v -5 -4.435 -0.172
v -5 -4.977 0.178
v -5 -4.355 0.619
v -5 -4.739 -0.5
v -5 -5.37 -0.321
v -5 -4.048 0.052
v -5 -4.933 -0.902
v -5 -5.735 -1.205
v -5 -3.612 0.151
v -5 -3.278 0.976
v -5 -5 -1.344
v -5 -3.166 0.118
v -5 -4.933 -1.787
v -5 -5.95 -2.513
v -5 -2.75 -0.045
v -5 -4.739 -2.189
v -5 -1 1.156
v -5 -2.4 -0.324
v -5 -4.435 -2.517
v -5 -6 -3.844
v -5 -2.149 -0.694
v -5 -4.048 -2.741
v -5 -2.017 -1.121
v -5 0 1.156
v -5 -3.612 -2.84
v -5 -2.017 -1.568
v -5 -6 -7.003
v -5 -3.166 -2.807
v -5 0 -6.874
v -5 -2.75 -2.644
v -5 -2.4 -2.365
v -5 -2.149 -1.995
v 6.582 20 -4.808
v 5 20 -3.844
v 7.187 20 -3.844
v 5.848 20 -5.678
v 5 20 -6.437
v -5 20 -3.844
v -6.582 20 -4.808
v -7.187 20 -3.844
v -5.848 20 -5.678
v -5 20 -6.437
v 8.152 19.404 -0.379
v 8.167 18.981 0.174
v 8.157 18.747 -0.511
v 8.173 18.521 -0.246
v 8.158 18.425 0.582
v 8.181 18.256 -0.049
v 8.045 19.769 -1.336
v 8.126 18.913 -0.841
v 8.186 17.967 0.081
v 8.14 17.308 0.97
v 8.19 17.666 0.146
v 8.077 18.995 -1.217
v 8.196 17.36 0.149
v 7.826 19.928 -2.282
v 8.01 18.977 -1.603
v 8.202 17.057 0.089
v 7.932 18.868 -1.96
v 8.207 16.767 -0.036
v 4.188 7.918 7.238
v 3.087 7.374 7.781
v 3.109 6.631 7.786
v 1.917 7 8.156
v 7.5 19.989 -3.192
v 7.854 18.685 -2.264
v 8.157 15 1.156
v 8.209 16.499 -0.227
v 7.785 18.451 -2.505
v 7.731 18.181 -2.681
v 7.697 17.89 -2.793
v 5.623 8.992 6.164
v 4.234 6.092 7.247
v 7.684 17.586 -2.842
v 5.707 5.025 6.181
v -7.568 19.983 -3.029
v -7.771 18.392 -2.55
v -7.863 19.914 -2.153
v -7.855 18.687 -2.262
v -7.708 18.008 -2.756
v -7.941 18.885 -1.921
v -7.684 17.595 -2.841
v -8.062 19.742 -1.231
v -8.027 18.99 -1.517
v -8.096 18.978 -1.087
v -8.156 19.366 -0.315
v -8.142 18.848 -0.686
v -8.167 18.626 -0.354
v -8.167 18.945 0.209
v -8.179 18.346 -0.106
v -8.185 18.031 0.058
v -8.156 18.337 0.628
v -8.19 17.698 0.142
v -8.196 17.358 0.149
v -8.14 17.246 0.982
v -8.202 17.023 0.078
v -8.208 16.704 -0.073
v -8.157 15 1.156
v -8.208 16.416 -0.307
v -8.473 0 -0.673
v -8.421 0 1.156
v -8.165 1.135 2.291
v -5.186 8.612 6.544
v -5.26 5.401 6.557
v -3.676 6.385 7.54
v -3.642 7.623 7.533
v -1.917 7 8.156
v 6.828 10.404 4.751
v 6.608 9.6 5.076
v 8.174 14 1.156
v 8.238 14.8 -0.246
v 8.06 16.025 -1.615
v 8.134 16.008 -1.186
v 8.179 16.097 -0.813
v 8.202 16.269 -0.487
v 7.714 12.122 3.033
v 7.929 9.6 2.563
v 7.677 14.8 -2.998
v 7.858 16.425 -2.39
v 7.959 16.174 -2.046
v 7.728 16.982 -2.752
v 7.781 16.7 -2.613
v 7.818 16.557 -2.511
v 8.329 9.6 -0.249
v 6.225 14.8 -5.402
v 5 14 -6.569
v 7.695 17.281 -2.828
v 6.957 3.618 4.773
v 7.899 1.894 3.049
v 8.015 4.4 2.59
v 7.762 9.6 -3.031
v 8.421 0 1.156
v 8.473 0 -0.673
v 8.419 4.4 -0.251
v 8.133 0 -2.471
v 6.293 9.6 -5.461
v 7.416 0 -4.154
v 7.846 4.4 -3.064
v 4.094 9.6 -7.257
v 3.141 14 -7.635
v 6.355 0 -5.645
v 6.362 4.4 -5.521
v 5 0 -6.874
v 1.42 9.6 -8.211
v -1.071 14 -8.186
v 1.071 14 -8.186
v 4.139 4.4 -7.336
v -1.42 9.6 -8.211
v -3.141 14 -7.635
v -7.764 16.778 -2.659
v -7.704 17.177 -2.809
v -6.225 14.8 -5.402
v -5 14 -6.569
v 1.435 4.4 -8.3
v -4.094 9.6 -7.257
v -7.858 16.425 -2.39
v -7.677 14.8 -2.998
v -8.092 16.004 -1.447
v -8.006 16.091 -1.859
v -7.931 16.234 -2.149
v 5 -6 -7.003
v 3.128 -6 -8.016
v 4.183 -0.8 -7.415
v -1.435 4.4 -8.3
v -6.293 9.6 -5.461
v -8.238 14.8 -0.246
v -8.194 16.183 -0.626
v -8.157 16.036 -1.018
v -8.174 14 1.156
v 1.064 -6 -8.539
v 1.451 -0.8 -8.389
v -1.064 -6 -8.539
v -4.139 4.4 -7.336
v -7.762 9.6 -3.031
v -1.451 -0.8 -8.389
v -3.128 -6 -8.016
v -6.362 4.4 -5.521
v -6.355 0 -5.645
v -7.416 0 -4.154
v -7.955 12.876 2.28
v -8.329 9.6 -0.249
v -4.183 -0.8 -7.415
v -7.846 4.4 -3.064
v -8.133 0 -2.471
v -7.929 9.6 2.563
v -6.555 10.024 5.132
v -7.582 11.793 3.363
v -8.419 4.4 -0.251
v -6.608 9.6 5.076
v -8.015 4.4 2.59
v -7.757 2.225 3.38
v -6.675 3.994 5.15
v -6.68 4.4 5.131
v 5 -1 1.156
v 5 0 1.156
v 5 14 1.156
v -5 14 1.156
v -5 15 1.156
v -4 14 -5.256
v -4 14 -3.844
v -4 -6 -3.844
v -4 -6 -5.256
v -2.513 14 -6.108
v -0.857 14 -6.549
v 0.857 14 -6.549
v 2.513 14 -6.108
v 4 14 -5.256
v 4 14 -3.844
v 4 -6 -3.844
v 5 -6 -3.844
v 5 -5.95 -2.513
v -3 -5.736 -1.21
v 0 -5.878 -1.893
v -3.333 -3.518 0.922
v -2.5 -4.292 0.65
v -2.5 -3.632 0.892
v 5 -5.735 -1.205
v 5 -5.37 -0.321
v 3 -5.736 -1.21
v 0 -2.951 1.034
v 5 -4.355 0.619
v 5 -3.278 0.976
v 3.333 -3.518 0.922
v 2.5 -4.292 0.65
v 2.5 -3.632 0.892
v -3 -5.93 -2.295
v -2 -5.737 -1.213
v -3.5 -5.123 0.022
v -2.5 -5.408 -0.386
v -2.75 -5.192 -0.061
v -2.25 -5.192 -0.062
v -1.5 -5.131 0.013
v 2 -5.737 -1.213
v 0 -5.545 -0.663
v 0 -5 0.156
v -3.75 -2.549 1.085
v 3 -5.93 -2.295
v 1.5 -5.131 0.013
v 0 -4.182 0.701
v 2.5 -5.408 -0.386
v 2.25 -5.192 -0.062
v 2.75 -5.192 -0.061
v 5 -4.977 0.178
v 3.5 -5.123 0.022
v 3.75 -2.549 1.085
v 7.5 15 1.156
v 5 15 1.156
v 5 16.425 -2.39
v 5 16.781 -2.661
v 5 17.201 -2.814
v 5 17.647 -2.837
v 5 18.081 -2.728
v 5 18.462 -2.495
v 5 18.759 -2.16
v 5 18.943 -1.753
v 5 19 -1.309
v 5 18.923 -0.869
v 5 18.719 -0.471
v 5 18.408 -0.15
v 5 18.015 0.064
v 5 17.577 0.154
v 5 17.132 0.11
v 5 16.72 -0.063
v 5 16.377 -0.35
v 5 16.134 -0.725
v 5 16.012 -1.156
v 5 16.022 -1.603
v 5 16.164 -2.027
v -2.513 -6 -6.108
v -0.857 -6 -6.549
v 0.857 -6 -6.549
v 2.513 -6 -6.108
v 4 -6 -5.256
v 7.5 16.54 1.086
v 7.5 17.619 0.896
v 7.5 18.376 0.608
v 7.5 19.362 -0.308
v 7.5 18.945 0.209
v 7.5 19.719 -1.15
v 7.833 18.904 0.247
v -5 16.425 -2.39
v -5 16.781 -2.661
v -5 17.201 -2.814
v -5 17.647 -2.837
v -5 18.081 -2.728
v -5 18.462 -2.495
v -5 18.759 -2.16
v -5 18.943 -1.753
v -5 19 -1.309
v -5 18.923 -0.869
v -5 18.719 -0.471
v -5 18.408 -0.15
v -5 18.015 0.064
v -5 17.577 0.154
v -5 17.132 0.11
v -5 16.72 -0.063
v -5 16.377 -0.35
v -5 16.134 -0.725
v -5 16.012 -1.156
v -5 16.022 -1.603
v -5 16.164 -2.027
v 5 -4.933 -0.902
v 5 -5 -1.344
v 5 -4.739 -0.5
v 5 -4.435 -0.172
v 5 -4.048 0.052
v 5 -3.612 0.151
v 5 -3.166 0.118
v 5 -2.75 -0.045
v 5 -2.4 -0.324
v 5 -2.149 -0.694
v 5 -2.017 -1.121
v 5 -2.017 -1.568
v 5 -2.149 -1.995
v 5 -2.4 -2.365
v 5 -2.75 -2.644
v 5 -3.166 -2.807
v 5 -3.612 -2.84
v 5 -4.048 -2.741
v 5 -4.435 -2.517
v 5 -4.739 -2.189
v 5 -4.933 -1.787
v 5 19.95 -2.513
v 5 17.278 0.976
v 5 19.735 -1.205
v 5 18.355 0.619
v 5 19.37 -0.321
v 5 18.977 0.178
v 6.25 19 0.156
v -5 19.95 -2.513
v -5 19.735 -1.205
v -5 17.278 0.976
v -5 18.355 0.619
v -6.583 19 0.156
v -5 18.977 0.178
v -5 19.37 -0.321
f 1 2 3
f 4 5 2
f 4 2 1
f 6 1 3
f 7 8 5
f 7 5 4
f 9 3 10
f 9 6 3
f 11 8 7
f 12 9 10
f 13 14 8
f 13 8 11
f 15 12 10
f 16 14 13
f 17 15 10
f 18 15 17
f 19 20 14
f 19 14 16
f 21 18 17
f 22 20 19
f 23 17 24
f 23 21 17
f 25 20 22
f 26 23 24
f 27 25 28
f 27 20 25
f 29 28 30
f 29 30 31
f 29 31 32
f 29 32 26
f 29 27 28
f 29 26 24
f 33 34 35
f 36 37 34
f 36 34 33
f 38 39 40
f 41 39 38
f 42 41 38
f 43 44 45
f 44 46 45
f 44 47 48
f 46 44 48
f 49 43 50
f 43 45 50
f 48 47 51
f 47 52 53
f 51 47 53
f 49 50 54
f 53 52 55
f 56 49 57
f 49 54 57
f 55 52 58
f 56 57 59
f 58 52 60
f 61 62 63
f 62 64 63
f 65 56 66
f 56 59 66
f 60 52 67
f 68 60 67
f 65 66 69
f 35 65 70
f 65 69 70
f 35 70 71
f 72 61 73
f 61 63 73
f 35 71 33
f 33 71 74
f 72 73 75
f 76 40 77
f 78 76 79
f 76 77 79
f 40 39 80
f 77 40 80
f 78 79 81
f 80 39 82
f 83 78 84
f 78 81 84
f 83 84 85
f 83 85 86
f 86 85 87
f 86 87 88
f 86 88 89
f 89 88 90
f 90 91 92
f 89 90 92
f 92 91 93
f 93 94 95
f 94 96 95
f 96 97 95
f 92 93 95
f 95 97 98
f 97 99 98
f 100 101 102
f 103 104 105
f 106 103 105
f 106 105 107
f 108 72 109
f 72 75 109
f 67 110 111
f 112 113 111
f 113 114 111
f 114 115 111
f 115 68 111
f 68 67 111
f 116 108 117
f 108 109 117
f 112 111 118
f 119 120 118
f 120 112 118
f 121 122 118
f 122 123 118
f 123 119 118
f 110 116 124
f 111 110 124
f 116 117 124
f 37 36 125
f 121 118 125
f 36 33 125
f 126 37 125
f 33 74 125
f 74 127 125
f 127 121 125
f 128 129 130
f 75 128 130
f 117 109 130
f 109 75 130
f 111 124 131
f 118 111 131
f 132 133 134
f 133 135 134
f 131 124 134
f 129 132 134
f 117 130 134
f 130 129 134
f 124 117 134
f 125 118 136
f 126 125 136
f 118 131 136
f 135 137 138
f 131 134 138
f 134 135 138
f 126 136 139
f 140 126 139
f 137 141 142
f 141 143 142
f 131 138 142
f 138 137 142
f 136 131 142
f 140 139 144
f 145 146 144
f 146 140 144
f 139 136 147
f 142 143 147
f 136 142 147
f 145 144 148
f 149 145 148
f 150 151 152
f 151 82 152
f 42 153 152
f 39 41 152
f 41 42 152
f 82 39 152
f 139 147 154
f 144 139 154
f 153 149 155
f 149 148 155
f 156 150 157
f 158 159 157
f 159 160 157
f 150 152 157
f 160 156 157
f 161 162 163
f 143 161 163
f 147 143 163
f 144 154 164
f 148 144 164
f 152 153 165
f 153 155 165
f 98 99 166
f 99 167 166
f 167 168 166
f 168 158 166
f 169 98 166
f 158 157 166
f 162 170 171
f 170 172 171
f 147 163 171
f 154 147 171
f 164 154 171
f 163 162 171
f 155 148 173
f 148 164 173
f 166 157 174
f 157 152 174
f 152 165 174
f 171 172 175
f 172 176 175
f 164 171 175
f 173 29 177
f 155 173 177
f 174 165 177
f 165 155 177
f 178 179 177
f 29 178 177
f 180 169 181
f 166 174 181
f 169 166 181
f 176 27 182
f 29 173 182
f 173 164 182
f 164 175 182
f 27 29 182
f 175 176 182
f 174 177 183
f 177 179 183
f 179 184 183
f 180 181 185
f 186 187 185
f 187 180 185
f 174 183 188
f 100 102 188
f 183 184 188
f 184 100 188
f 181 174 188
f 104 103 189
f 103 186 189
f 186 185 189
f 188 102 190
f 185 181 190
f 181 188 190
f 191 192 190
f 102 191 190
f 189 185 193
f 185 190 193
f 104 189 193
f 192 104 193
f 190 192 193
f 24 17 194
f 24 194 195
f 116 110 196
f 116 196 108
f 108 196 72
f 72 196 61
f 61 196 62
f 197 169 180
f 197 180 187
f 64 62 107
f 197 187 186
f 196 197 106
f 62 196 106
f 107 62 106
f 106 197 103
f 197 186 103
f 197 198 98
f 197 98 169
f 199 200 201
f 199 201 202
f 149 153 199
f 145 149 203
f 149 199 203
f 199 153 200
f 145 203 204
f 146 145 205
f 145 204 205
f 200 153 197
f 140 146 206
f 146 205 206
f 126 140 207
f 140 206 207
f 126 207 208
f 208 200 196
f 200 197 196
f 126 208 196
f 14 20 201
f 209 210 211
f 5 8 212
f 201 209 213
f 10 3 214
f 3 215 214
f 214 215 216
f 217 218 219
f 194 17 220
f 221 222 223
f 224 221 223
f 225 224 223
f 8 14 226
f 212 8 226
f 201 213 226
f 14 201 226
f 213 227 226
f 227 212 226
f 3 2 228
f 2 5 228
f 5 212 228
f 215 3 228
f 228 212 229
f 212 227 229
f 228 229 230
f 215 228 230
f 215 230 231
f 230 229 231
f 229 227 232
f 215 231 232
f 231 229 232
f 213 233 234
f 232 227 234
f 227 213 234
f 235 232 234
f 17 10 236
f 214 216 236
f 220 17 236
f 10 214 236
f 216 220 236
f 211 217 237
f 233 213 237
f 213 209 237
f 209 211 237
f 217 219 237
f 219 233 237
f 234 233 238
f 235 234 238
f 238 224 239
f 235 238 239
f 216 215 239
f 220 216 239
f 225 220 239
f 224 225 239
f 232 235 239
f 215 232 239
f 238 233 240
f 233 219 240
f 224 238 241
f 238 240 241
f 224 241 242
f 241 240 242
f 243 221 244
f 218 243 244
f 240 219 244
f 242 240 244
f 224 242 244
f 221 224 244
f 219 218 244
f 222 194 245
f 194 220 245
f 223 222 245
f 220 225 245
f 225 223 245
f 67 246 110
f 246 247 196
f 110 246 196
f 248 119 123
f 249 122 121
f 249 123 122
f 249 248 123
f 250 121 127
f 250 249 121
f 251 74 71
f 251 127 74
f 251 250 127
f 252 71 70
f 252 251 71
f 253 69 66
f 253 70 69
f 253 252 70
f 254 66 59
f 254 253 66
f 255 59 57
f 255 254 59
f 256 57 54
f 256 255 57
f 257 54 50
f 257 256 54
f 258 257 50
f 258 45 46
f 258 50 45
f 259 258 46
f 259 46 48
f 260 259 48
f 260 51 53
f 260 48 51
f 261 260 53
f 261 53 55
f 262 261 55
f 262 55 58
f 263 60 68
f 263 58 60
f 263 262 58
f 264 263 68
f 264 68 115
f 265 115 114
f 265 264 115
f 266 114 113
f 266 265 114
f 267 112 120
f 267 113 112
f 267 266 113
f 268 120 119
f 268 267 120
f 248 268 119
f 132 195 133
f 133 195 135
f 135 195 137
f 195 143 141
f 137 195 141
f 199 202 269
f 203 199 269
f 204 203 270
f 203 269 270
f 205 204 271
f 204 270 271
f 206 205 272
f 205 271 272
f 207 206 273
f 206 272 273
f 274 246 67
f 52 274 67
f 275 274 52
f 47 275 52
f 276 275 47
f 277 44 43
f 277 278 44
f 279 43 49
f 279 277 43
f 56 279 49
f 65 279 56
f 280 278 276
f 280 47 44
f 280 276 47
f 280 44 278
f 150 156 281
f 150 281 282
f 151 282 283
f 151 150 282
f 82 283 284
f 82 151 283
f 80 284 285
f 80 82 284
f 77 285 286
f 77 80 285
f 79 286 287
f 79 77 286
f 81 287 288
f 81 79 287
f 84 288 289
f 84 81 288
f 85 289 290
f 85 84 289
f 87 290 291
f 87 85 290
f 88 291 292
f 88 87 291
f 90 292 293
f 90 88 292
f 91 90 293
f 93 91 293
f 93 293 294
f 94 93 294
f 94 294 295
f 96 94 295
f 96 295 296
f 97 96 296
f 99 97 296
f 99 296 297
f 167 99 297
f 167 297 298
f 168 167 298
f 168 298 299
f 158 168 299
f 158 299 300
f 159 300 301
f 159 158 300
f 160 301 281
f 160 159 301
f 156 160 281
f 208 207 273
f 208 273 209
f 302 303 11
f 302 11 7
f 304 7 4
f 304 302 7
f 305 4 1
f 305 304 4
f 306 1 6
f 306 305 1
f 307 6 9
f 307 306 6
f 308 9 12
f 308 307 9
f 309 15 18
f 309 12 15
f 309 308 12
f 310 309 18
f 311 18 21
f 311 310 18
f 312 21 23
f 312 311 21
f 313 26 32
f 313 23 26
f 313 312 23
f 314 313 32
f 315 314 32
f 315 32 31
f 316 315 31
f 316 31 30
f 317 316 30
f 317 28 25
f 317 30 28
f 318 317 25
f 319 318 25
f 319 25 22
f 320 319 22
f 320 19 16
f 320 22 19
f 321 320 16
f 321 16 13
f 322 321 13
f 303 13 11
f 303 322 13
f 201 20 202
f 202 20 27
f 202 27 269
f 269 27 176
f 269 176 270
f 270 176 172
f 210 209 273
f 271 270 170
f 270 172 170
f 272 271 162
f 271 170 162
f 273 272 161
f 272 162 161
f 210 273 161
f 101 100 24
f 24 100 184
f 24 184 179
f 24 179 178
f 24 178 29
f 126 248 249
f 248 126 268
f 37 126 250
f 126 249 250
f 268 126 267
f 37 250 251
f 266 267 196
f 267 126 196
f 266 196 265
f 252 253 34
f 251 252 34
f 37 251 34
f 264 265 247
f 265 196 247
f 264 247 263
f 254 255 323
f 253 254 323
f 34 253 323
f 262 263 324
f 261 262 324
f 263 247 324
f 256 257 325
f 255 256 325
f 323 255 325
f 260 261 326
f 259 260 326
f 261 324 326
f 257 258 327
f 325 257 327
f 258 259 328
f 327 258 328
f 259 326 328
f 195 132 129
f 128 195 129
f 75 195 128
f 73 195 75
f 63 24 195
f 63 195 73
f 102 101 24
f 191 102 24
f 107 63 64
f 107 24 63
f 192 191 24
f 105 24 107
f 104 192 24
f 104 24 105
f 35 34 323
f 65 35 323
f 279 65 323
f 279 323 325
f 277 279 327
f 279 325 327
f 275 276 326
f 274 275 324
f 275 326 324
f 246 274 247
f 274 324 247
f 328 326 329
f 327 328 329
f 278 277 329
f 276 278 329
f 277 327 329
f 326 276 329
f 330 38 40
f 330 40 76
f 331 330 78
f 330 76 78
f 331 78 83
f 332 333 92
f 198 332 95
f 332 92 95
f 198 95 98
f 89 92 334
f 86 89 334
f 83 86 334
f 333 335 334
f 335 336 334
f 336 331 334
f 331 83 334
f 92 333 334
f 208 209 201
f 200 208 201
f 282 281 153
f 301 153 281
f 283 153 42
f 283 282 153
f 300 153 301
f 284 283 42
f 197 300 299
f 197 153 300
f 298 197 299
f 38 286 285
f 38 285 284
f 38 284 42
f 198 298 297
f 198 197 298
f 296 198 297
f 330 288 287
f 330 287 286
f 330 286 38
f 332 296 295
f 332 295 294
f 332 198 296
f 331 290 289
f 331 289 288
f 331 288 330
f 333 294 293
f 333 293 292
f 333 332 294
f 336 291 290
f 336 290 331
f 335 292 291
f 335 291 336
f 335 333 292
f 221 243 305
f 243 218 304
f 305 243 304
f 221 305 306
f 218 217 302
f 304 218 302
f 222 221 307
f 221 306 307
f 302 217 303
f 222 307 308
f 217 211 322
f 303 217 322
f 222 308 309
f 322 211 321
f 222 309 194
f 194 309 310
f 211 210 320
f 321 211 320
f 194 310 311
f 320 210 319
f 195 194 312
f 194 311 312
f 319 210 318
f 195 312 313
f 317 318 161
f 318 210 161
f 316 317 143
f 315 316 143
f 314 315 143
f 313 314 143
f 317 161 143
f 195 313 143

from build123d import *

# Parameters (mm, degrees)
SKETCH1_R                     = 8.5
BOSS_EXTRUDE1_DEPTH           = 20
BOSS_EXTRUDE1_TAPER           = 1
BOSS_EXTRUDE1_OTHER_WAY_DEPTH = 6
BOSS_EXTRUDE1_OTHER_WAY_TAPER = -1
CUT_EXTRUDE1_DEPTH            = 24.411167638
CUT_EXTRUDE1_DEPTH_BACK       = 24.411167638
CUT_EXTRUDE2_START            = -9.76024089
CUT_EXTRUDE2_OUTLINE_W        = 9.770566763
CUT_EXTRUDE2_OUTLINE_H        = 6
CUT_EXTRUDE2_DEPTH            = 9.76024089
CUT_EXTRUDE3_DEPTH            = 26.618184821
CUT_EXTRUDE3_DEPTH_BACK       = 26.618184821
SKETCH5_R                     = 1.5
FILLET1_SIZE                  = 5
CUT_EXTRUDE4_DEPTH            = 24.372877283
CUT_EXTRUDE4_DEPTH_BACK       = 24.372877283
SKETCH8_W                     = 10
SKETCH8_H                     = 6
CUT_EXTRUDE5_DEPTH            = 24.822516826
CUT_EXTRUDE6_DEPTH            = 26.618184821
CUT_EXTRUDE6_DEPTH_BACK       = 26.618184821
SKETCH9_R                     = 1.5
FILLET2_SIZE                  = 5
CUT_EXTRUDE7_DEPTH            = 29.675623685


with BuildPart() as part:
    # Sketch1 → Boss-Extrude1 (new body)
    with BuildSketch(Plane(origin=(0, 0, 0), x_dir=(1, 0, 0), z_dir=(0, 1, 0))):
        Circle(SKETCH1_R)
    extrude(amount=BOSS_EXTRUDE1_DEPTH, taper=BOSS_EXTRUDE1_TAPER)

    # Sketch1 → Boss-Extrude1 other way (add)
    with BuildSketch(Plane(origin=(0, 0, 0), x_dir=(1, 0, 0), z_dir=(0, 1, 0))):
        Circle(SKETCH1_R)
    extrude(amount=-BOSS_EXTRUDE1_OTHER_WAY_DEPTH, taper=BOSS_EXTRUDE1_OTHER_WAY_TAPER)

    # Sketch3 → Cut-Extrude1 (cut, two sides: drawn at the far end of the back side and taken through both)
    with BuildSketch(Plane(origin=(0, 0, 0), x_dir=(0, 0, -1), z_dir=(1, 0, 0)).offset(-CUT_EXTRUDE1_DEPTH_BACK)):
        Polygon((-1.155510401, -6), (-1.155510401, 0), (-11.155510401, 10), (-11.155510401, -6), align=None)
    extrude(amount=CUT_EXTRUDE1_DEPTH + CUT_EXTRUDE1_DEPTH_BACK, mode=Mode.SUBTRACT)

    # Cut-Extrude2: read off the stored shape, not the designer's step
    # Cut-Extrude2 outline → Cut-Extrude2 (cut)
    with BuildSketch(Plane.XY.offset(1.155510401).offset(CUT_EXTRUDE2_START)):
        with Locations((-9.885283382, -3)):
            Rectangle(CUT_EXTRUDE2_OUTLINE_W, CUT_EXTRUDE2_OUTLINE_H)
        with Locations((9.885283382, -3)):
            Rectangle(CUT_EXTRUDE2_OUTLINE_W, CUT_EXTRUDE2_OUTLINE_H)
    extrude(amount=CUT_EXTRUDE2_DEPTH, mode=Mode.SUBTRACT)

    # Sketch5 → Cut-Extrude3 (cut, two sides: drawn at the far end of the back side and taken through both)
    with BuildSketch(Plane.ZY.offset(5).offset(-CUT_EXTRUDE3_DEPTH_BACK)):
        with Locations(Location((-1.344489599, -3.5, 0), (0, 0, 270))):
            Circle(SKETCH5_R)
    extrude(amount=CUT_EXTRUDE3_DEPTH + CUT_EXTRUDE3_DEPTH_BACK, mode=Mode.SUBTRACT)

    # Fillet1
    # a fillet whose section is not a circle: 5 mm, written as the material it takes off along each edge
    with BuildSketch(Plane(origin=(17.5, -6, 1.155510401), x_dir=(0, 0, -1), z_dir=(-1, 0, 0))) as fillet1_piece_1:
        with BuildLine():
            Bezier((FILLET1_SIZE, 0), (0, 0), (0, -FILLET1_SIZE), weights=[1, 1.5, 1])
            Line((0, -FILLET1_SIZE), (0, 0))
            Line((0, 0), (FILLET1_SIZE, 0))
        make_face()
    extrude(amount=35, mode=Mode.SUBTRACT)

    # Sketch7 → Cut-Extrude4 (cut, two sides: drawn at the far end of the back side and taken through both)
    with BuildSketch(Plane(origin=(0, 0, 0), x_dir=(0, 0, -1), z_dir=(1, 0, 0)).offset(-CUT_EXTRUDE4_DEPTH_BACK)):
        Polygon((-1.155510401, 20), (-1.155510401, 14), (-12.24506556, 2.91044484), (-12.24506556, 20), align=None)
    extrude(amount=CUT_EXTRUDE4_DEPTH + CUT_EXTRUDE4_DEPTH_BACK, mode=Mode.SUBTRACT)

    # Sketch8 → Cut-Extrude5 (cut, through all)
    with BuildSketch(Plane.XY.offset(1.155510401)):
        with Locations((0, 17)):
            Rectangle(SKETCH8_W, SKETCH8_H)
    extrude(amount=-CUT_EXTRUDE5_DEPTH, mode=Mode.SUBTRACT)

    # Sketch9 → Cut-Extrude6 (cut, two sides: drawn at the far end of the back side and taken through both)
    with BuildSketch(Plane(origin=(-5, 0, 0), x_dir=(0, 0, -1), z_dir=(1, 0, 0)).offset(-CUT_EXTRUDE6_DEPTH_BACK)):
        with Locations(Location((1.344489599, 17.5, 0), (0, 0, 314.198748603))):
            Circle(SKETCH9_R)
    extrude(amount=CUT_EXTRUDE6_DEPTH + CUT_EXTRUDE6_DEPTH_BACK, mode=Mode.SUBTRACT)

    # Fillet2
    # a fillet whose section is not a circle: 5 mm, written as the material it takes off along each edge
    with BuildSketch(Plane(origin=(-20.568577654, 20, 1.155510401), x_dir=(0, 0, -1), z_dir=(1, 0, 0))) as fillet2_piece_1:
        with BuildLine():
            Bezier((FILLET2_SIZE, 0), (0, 0), (0, -FILLET2_SIZE), weights=[1, 1.5, 1])
            Line((0, -FILLET2_SIZE), (0, 0))
            Line((0, 0), (FILLET2_SIZE, 0))
        make_face()
    extrude(amount=28.068577654, mode=Mode.SUBTRACT)
    with BuildSketch(Plane(origin=(-7.5, 20, 1.155510401), x_dir=(0, -1, 0), z_dir=(1, 0, 0))) as fillet2_piece_2:
        with BuildLine():
            Bezier((FILLET2_SIZE, 0), (0, 0), (0, FILLET2_SIZE), weights=[1, 1.5, 1])
            Line((0, FILLET2_SIZE), (0, 0))
            Line((0, 0), (FILLET2_SIZE, 0))
        make_face()
    extrude(amount=28.068577654, mode=Mode.SUBTRACT)

    # Sketch10 → Cut-Extrude7 (cut, through all)
    with BuildSketch(Plane.XZ.offset(6)):
        with BuildLine():
            Line((-4, -3.844489599), (-4, -5.255707709))
            ThreePointArc((-4, -5.255707709), (0, -6.60473039), (4, -5.255707709))
            Line((4, -5.255707709), (4, -3.844489599))
            Line((4, -3.844489599), (-4, -3.844489599))
        make_face()
    extrude(amount=-CUT_EXTRUDE7_DEPTH, mode=Mode.SUBTRACT)


solid = part.part
